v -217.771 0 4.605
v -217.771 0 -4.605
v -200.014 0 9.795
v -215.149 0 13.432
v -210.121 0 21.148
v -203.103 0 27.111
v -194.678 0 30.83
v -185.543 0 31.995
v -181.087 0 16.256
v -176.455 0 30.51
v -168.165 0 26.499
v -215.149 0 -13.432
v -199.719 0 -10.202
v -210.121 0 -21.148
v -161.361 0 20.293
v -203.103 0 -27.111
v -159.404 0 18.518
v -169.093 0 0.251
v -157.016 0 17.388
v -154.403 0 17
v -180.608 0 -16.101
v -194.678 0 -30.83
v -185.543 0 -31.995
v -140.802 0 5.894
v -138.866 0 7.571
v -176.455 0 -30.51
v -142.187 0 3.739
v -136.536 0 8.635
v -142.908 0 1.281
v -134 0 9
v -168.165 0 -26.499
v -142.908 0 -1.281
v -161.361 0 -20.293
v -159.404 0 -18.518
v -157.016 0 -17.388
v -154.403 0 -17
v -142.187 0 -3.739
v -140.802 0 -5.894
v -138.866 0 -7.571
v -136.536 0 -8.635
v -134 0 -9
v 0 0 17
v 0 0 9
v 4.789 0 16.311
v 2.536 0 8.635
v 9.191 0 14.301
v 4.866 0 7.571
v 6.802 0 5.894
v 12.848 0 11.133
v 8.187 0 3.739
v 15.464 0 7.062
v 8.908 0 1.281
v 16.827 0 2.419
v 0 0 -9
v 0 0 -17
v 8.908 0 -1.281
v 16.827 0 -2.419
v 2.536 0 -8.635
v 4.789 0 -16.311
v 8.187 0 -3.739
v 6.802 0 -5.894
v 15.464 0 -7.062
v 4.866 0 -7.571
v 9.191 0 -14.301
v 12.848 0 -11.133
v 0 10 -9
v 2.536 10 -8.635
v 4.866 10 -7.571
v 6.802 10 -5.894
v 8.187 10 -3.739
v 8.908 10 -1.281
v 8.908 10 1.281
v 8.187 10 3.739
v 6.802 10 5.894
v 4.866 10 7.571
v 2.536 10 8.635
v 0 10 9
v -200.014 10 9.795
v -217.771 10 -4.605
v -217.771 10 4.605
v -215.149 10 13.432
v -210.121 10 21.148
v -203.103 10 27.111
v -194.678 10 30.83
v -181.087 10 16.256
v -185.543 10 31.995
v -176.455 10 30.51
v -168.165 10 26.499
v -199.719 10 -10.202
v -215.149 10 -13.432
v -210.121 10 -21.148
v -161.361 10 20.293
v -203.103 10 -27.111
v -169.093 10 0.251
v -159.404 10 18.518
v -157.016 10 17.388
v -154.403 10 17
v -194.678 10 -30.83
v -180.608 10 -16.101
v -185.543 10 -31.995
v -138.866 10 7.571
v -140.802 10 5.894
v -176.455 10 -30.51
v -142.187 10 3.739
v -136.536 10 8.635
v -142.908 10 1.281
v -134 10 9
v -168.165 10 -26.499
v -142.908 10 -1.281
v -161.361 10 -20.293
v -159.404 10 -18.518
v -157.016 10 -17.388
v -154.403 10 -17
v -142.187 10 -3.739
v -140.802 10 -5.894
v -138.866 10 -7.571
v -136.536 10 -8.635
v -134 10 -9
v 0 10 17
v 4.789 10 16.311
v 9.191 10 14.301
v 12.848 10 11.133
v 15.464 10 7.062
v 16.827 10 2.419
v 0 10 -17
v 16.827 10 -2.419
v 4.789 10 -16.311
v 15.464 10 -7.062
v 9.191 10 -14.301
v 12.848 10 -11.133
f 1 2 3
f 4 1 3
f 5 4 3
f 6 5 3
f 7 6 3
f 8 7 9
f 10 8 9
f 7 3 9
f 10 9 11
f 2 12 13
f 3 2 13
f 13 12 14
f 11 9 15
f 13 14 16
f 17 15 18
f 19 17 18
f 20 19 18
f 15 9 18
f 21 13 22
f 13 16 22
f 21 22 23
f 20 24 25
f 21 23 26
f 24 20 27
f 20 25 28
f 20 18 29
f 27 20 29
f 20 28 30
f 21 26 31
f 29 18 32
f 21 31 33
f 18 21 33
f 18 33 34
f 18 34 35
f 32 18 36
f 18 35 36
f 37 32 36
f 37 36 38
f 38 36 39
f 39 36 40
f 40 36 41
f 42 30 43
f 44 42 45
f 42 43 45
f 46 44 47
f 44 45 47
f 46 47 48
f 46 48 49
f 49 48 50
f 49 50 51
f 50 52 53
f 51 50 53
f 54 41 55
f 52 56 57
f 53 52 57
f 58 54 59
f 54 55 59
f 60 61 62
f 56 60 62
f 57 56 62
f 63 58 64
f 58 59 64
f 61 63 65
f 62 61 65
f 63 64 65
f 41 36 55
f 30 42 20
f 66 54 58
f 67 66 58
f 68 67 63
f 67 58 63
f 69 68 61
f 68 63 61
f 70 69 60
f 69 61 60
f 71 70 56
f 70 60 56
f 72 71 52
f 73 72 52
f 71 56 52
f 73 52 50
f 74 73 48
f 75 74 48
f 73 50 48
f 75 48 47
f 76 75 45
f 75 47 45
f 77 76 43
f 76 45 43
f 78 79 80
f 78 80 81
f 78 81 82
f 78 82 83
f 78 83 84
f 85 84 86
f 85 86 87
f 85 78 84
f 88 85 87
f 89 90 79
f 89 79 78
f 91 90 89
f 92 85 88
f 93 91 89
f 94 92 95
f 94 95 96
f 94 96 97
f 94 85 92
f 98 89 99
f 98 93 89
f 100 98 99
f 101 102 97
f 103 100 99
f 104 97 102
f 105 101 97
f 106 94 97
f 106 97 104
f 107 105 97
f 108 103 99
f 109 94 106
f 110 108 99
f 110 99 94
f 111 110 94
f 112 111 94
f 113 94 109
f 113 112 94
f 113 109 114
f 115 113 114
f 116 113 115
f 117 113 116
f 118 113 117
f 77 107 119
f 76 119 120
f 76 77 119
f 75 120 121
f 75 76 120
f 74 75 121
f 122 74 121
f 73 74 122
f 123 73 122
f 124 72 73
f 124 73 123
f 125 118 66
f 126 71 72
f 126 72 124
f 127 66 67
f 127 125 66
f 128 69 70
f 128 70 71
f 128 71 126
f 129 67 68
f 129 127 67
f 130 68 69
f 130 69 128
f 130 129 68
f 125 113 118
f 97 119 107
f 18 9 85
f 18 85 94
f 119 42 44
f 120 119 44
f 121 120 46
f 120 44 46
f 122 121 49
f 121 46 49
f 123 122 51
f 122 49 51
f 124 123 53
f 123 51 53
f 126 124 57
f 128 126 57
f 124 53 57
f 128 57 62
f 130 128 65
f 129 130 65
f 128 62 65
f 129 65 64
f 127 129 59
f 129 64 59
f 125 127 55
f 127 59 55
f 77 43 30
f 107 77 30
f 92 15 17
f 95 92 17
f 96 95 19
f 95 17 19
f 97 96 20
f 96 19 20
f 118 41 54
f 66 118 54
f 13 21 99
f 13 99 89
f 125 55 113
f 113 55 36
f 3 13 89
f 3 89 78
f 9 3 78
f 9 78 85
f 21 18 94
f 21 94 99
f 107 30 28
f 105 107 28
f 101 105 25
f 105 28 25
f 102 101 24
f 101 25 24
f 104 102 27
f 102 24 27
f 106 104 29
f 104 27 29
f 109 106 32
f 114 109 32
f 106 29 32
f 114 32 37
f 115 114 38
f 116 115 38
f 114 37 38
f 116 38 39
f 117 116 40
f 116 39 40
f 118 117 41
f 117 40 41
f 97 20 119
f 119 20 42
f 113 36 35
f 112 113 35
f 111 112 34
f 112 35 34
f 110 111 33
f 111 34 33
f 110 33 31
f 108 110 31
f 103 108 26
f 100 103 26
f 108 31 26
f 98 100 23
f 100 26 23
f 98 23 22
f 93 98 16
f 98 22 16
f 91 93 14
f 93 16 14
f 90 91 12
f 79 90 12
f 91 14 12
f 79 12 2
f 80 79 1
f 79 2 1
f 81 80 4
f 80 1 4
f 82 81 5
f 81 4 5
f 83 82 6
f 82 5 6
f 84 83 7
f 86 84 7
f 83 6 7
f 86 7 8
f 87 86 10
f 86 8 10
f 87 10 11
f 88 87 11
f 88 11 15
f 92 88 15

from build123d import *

# Parameters (mm, degrees)
SKETCH1_R           = 32
BOSS_EXTRUDE1_DEPTH = 10


with BuildPart() as part:
    # Sketch1 → Boss-Extrude1 (new body)
    # profile 1 of 2: a face of its own
    with BuildSketch(Plane(origin=(0, 0, 0), x_dir=(1, 0, 0), z_dir=(0, 1, 0))):
        with Locations((-186.104281586, 0)):
            Circle(SKETCH1_R)
        Polygon((-169.093123496, -0.251434953), (-180.608415791, 16.100875078), (-199.718807817, 10.202323), (-200.014387332, -9.7954927), (-181.086673492, -16.256270425), align=None, mode=Mode.SUBTRACT)
    # profile 2 of 2: a face of its own
    with BuildSketch(Plane(origin=(0, 0, 0), x_dir=(1, 0, 0), z_dir=(0, 1, 0))):
        with BuildLine():
            Line((0, 17), (-134, 17))
            Line((-134, 17), (-154.402546617, 17))
            ThreePointArc((-154.402546617, 17), (-158.25184177, 17.864711017), (-161.361464049, 20.292682927))
            ThreePointArc((-161.361464049, 20.292682927), (-155.973150167, 10.775663294), (-154.104281586, 0))
            ThreePointArc((-154.104281586, 0), (-155.973150167, -10.775663294), (-161.361464049, -20.292682927))
            ThreePointArc((-161.361464049, -20.292682927), (-158.25184177, -17.864711017), (-154.402546617, -17))
            Line((-154.402546617, -17), (-134, -17))
            Line((-134, -17), (0, -17))
            ThreePointArc((0, -17), (17, 0), (0, 17))
        make_face()
        with BuildLine():
            ThreePointArc((-134, -9), (-143, 0), (-134, 9))
            Line((-134, 9), (0, 9))
            ThreePointArc((0, 9), (9, 0), (0, -9))
            Line((0, -9), (-134, -9))
        make_face(mode=Mode.SUBTRACT)
    extrude(amount=BOSS_EXTRUDE1_DEPTH)


solid = part.part
